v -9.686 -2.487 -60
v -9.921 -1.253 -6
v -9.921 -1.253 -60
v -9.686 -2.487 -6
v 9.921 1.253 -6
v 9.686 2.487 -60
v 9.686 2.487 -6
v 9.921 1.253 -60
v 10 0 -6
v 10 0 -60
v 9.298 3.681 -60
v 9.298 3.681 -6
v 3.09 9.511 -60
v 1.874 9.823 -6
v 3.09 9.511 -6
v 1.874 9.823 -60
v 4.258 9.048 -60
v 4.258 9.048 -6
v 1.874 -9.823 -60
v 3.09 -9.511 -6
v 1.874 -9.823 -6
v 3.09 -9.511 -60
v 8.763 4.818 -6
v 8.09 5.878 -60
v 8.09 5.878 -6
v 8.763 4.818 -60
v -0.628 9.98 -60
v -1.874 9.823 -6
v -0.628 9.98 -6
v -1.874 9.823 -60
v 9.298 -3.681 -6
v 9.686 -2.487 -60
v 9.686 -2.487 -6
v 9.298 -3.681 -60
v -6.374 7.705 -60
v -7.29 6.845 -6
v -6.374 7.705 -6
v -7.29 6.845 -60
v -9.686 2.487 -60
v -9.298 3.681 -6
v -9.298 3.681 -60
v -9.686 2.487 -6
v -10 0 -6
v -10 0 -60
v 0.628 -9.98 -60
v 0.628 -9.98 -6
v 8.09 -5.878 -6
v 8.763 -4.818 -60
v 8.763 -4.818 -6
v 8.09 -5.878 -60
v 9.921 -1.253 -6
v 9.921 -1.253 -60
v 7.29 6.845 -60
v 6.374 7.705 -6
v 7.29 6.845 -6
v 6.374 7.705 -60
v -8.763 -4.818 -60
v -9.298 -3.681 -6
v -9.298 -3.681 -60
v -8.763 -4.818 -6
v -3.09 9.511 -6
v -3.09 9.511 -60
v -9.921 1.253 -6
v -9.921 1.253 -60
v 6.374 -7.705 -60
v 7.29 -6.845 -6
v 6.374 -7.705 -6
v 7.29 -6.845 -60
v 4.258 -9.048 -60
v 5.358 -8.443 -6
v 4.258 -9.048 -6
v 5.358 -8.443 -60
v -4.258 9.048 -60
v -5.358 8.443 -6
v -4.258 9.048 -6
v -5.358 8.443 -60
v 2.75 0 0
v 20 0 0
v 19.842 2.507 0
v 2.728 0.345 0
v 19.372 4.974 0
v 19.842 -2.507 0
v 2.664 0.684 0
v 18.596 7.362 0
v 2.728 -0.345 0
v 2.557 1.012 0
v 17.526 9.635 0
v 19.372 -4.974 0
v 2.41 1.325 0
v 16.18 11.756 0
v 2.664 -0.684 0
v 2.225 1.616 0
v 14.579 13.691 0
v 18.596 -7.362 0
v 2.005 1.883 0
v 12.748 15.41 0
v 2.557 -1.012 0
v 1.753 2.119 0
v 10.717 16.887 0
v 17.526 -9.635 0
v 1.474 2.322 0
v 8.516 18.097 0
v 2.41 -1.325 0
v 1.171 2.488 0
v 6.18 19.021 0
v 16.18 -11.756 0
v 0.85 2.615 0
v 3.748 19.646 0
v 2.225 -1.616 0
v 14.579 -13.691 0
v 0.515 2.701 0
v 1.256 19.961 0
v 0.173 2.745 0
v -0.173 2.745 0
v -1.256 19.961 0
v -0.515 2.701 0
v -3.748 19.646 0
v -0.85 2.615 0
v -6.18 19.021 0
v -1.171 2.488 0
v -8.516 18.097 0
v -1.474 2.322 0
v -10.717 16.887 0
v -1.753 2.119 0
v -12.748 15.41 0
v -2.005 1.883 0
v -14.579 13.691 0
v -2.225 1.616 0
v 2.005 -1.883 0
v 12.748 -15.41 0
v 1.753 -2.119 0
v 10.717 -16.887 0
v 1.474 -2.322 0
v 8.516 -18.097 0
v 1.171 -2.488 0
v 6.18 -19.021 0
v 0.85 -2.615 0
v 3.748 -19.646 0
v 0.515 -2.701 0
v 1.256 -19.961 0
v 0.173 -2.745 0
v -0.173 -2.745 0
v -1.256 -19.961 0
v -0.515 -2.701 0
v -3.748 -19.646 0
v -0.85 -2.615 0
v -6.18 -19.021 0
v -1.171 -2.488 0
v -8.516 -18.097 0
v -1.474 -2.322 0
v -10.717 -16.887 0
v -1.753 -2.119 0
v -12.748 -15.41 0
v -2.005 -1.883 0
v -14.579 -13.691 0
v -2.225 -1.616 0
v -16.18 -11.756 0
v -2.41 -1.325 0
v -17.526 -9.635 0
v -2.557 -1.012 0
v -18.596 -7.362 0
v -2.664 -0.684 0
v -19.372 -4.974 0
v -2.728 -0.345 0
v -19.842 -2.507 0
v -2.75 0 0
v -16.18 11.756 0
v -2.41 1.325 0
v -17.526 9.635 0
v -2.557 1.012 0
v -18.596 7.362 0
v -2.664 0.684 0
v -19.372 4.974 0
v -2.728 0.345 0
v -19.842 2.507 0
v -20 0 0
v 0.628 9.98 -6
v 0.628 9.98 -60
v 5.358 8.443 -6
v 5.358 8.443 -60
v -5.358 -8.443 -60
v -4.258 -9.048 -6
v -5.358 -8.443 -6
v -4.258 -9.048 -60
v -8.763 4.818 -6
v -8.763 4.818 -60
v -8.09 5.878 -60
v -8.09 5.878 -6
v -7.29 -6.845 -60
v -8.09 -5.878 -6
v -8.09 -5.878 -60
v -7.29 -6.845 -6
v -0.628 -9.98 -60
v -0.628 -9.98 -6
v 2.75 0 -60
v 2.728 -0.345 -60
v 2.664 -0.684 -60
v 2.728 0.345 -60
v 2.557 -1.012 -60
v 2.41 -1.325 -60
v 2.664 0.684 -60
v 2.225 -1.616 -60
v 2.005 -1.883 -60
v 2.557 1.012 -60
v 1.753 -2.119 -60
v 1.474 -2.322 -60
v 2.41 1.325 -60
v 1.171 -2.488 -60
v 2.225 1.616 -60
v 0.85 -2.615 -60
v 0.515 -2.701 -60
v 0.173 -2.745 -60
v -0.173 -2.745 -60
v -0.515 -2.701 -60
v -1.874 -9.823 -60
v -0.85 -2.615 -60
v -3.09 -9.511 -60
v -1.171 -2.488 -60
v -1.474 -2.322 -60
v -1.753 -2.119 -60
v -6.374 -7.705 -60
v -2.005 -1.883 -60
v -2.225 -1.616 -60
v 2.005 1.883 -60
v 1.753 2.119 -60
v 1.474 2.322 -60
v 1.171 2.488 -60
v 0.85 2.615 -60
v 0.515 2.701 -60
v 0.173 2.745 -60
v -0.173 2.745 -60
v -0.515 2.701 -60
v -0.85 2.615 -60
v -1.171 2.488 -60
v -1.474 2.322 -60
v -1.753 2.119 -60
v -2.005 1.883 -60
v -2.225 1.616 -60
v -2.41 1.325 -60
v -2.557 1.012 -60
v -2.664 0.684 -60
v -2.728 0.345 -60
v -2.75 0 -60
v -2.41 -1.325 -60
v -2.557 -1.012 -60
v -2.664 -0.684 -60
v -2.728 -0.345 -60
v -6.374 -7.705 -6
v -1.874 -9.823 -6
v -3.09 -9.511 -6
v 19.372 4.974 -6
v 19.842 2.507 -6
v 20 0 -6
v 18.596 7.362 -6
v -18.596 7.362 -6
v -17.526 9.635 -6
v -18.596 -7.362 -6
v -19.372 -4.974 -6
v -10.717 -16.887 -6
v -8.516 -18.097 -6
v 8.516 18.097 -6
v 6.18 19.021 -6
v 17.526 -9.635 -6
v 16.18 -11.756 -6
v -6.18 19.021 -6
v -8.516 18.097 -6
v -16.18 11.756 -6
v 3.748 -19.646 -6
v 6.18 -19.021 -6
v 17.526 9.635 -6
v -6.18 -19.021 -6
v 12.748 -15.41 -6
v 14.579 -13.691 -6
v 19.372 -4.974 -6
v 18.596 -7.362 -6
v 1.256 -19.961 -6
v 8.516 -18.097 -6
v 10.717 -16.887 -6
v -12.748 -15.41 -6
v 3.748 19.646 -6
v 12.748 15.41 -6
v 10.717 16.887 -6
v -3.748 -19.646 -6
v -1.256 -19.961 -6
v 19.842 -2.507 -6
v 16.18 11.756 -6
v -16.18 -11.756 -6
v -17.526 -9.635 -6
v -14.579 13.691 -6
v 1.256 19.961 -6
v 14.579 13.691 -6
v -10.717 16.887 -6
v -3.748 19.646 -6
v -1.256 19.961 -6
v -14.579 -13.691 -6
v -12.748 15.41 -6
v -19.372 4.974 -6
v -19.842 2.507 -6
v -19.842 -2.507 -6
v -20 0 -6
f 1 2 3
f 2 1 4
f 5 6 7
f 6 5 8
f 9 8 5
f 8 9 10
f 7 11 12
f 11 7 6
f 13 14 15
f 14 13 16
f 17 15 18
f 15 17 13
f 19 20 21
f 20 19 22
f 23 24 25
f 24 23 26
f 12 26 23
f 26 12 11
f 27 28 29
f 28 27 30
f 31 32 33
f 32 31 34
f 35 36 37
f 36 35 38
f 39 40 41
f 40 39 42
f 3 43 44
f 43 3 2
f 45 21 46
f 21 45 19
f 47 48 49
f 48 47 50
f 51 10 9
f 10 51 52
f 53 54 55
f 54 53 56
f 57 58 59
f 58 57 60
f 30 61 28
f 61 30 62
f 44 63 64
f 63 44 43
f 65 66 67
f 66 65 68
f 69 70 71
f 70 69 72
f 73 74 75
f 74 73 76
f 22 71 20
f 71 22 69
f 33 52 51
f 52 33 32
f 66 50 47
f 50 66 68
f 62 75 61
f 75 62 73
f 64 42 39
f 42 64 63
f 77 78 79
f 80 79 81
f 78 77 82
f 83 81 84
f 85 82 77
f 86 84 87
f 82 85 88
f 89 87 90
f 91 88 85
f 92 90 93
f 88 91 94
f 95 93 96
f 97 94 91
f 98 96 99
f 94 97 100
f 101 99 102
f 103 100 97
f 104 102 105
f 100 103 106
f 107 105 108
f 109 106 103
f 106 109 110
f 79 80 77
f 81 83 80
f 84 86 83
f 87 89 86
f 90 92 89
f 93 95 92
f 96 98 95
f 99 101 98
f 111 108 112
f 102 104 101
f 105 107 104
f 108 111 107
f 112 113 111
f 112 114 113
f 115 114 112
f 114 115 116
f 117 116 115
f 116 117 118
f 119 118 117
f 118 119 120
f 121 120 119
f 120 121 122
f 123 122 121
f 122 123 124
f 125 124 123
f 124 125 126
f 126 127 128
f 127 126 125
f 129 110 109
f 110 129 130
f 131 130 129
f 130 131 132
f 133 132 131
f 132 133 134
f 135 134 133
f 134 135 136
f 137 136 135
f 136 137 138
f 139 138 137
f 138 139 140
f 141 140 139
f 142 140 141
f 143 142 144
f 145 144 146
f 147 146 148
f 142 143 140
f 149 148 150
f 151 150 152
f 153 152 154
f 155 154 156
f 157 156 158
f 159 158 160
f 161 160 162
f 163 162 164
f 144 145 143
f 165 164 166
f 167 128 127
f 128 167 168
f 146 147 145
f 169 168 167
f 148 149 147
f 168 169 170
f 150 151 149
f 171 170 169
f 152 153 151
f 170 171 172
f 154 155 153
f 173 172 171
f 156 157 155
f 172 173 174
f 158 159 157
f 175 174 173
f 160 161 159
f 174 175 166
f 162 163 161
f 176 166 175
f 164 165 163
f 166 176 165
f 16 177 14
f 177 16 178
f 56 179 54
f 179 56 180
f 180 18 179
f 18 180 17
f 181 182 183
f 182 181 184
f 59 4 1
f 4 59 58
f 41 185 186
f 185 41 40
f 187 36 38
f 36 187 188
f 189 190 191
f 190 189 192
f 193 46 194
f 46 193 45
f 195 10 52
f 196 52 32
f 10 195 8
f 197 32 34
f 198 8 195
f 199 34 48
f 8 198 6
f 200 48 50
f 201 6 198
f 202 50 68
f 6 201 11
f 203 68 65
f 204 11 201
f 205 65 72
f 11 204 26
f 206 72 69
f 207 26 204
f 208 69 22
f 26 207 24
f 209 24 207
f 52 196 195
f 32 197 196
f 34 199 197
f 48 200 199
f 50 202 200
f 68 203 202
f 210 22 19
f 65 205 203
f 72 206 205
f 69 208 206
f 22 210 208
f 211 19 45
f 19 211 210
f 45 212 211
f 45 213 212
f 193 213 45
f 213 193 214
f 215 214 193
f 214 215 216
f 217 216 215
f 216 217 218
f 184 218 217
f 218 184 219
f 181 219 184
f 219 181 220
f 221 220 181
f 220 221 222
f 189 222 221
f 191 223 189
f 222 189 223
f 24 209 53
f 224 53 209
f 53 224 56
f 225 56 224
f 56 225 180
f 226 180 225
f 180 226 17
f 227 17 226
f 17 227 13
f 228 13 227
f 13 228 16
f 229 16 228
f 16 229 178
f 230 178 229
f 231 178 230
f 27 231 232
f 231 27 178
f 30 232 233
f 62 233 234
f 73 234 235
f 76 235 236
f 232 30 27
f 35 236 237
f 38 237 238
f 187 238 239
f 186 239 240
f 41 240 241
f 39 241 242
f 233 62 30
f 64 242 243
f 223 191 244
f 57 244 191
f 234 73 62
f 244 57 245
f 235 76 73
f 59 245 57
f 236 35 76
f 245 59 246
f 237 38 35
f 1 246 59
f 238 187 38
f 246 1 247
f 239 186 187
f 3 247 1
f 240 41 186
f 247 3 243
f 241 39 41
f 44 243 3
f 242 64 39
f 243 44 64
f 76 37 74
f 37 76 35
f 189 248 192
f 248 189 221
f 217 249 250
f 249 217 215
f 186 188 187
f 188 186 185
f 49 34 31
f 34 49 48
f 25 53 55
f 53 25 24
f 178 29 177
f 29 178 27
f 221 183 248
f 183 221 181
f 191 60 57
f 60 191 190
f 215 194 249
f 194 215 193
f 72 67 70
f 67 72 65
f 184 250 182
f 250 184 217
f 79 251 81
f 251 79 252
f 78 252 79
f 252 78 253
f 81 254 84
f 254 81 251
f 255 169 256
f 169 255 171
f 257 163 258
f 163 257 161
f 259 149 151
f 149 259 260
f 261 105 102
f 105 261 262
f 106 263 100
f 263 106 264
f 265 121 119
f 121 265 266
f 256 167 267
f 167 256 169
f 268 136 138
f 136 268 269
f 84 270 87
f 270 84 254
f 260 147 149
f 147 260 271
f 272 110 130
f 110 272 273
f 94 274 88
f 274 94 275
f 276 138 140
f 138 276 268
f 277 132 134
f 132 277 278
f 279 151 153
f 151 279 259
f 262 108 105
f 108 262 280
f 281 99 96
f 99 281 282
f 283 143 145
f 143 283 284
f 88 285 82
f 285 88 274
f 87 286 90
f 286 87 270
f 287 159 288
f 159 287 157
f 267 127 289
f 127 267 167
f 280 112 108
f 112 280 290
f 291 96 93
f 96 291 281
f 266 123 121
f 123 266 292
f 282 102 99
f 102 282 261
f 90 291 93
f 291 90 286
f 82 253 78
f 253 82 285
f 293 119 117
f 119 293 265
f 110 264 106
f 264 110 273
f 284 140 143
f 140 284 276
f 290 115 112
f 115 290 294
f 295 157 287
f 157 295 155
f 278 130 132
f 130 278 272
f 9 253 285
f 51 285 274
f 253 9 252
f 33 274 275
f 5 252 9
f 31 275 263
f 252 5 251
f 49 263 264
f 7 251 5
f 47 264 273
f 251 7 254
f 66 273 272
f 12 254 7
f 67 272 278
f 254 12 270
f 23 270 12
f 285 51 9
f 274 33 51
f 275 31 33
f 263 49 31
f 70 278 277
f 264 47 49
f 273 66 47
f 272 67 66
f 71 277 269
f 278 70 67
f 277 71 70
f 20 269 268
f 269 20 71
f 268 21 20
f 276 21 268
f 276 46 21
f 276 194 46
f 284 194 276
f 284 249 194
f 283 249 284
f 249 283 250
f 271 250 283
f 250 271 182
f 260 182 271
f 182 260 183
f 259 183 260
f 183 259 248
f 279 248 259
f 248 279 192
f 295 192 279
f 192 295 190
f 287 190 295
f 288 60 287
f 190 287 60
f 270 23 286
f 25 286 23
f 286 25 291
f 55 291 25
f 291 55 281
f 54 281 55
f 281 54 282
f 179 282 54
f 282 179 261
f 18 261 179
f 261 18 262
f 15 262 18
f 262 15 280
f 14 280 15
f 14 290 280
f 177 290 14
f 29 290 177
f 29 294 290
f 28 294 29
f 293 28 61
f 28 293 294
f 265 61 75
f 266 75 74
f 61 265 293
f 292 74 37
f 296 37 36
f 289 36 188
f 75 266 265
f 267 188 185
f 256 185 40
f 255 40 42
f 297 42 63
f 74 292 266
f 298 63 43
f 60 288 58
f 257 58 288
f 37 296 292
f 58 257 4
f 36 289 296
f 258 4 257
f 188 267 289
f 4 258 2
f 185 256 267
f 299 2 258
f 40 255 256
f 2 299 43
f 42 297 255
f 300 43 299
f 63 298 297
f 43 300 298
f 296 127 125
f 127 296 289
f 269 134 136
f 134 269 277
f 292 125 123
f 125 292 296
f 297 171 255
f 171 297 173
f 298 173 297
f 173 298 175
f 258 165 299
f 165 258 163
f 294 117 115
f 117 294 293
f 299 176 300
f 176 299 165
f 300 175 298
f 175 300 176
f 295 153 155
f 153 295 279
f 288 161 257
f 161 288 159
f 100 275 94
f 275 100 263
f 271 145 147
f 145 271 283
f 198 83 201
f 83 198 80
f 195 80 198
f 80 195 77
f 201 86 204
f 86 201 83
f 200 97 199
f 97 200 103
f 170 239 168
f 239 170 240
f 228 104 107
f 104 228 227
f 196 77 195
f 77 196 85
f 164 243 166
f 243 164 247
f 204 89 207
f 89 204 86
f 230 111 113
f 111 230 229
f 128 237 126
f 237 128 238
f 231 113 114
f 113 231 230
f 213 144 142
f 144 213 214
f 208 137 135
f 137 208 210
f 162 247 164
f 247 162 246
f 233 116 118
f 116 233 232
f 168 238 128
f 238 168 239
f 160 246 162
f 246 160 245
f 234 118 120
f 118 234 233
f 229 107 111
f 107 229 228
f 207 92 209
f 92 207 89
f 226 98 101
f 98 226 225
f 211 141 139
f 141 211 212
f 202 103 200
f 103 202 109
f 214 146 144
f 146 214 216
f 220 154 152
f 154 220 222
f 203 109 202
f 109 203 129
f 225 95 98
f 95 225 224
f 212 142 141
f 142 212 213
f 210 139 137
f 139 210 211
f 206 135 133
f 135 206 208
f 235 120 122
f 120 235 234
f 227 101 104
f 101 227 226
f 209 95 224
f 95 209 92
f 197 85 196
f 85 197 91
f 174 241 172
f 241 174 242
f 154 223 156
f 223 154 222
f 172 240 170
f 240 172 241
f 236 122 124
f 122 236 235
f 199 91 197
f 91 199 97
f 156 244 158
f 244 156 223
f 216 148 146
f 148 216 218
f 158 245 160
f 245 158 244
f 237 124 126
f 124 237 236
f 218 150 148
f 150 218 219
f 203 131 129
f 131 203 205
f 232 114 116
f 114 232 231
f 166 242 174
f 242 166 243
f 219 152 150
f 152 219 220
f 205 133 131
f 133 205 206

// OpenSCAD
$fn = 50;


difference() {
	union() {
		translate(v = [0, 0, -60.0000000000]) {
			cylinder(h = 60, r = 10.0000000000);
		}
		translate(v = [0, 0, -6.0000000000]) {
			cylinder(h = 6, r = 20.0000000000);
		}
	}
	union() {
		#translate(v = [0, 0, -60]) {
			cylinder(h = 60, r = 2.7500000000);
		}
	}
}
